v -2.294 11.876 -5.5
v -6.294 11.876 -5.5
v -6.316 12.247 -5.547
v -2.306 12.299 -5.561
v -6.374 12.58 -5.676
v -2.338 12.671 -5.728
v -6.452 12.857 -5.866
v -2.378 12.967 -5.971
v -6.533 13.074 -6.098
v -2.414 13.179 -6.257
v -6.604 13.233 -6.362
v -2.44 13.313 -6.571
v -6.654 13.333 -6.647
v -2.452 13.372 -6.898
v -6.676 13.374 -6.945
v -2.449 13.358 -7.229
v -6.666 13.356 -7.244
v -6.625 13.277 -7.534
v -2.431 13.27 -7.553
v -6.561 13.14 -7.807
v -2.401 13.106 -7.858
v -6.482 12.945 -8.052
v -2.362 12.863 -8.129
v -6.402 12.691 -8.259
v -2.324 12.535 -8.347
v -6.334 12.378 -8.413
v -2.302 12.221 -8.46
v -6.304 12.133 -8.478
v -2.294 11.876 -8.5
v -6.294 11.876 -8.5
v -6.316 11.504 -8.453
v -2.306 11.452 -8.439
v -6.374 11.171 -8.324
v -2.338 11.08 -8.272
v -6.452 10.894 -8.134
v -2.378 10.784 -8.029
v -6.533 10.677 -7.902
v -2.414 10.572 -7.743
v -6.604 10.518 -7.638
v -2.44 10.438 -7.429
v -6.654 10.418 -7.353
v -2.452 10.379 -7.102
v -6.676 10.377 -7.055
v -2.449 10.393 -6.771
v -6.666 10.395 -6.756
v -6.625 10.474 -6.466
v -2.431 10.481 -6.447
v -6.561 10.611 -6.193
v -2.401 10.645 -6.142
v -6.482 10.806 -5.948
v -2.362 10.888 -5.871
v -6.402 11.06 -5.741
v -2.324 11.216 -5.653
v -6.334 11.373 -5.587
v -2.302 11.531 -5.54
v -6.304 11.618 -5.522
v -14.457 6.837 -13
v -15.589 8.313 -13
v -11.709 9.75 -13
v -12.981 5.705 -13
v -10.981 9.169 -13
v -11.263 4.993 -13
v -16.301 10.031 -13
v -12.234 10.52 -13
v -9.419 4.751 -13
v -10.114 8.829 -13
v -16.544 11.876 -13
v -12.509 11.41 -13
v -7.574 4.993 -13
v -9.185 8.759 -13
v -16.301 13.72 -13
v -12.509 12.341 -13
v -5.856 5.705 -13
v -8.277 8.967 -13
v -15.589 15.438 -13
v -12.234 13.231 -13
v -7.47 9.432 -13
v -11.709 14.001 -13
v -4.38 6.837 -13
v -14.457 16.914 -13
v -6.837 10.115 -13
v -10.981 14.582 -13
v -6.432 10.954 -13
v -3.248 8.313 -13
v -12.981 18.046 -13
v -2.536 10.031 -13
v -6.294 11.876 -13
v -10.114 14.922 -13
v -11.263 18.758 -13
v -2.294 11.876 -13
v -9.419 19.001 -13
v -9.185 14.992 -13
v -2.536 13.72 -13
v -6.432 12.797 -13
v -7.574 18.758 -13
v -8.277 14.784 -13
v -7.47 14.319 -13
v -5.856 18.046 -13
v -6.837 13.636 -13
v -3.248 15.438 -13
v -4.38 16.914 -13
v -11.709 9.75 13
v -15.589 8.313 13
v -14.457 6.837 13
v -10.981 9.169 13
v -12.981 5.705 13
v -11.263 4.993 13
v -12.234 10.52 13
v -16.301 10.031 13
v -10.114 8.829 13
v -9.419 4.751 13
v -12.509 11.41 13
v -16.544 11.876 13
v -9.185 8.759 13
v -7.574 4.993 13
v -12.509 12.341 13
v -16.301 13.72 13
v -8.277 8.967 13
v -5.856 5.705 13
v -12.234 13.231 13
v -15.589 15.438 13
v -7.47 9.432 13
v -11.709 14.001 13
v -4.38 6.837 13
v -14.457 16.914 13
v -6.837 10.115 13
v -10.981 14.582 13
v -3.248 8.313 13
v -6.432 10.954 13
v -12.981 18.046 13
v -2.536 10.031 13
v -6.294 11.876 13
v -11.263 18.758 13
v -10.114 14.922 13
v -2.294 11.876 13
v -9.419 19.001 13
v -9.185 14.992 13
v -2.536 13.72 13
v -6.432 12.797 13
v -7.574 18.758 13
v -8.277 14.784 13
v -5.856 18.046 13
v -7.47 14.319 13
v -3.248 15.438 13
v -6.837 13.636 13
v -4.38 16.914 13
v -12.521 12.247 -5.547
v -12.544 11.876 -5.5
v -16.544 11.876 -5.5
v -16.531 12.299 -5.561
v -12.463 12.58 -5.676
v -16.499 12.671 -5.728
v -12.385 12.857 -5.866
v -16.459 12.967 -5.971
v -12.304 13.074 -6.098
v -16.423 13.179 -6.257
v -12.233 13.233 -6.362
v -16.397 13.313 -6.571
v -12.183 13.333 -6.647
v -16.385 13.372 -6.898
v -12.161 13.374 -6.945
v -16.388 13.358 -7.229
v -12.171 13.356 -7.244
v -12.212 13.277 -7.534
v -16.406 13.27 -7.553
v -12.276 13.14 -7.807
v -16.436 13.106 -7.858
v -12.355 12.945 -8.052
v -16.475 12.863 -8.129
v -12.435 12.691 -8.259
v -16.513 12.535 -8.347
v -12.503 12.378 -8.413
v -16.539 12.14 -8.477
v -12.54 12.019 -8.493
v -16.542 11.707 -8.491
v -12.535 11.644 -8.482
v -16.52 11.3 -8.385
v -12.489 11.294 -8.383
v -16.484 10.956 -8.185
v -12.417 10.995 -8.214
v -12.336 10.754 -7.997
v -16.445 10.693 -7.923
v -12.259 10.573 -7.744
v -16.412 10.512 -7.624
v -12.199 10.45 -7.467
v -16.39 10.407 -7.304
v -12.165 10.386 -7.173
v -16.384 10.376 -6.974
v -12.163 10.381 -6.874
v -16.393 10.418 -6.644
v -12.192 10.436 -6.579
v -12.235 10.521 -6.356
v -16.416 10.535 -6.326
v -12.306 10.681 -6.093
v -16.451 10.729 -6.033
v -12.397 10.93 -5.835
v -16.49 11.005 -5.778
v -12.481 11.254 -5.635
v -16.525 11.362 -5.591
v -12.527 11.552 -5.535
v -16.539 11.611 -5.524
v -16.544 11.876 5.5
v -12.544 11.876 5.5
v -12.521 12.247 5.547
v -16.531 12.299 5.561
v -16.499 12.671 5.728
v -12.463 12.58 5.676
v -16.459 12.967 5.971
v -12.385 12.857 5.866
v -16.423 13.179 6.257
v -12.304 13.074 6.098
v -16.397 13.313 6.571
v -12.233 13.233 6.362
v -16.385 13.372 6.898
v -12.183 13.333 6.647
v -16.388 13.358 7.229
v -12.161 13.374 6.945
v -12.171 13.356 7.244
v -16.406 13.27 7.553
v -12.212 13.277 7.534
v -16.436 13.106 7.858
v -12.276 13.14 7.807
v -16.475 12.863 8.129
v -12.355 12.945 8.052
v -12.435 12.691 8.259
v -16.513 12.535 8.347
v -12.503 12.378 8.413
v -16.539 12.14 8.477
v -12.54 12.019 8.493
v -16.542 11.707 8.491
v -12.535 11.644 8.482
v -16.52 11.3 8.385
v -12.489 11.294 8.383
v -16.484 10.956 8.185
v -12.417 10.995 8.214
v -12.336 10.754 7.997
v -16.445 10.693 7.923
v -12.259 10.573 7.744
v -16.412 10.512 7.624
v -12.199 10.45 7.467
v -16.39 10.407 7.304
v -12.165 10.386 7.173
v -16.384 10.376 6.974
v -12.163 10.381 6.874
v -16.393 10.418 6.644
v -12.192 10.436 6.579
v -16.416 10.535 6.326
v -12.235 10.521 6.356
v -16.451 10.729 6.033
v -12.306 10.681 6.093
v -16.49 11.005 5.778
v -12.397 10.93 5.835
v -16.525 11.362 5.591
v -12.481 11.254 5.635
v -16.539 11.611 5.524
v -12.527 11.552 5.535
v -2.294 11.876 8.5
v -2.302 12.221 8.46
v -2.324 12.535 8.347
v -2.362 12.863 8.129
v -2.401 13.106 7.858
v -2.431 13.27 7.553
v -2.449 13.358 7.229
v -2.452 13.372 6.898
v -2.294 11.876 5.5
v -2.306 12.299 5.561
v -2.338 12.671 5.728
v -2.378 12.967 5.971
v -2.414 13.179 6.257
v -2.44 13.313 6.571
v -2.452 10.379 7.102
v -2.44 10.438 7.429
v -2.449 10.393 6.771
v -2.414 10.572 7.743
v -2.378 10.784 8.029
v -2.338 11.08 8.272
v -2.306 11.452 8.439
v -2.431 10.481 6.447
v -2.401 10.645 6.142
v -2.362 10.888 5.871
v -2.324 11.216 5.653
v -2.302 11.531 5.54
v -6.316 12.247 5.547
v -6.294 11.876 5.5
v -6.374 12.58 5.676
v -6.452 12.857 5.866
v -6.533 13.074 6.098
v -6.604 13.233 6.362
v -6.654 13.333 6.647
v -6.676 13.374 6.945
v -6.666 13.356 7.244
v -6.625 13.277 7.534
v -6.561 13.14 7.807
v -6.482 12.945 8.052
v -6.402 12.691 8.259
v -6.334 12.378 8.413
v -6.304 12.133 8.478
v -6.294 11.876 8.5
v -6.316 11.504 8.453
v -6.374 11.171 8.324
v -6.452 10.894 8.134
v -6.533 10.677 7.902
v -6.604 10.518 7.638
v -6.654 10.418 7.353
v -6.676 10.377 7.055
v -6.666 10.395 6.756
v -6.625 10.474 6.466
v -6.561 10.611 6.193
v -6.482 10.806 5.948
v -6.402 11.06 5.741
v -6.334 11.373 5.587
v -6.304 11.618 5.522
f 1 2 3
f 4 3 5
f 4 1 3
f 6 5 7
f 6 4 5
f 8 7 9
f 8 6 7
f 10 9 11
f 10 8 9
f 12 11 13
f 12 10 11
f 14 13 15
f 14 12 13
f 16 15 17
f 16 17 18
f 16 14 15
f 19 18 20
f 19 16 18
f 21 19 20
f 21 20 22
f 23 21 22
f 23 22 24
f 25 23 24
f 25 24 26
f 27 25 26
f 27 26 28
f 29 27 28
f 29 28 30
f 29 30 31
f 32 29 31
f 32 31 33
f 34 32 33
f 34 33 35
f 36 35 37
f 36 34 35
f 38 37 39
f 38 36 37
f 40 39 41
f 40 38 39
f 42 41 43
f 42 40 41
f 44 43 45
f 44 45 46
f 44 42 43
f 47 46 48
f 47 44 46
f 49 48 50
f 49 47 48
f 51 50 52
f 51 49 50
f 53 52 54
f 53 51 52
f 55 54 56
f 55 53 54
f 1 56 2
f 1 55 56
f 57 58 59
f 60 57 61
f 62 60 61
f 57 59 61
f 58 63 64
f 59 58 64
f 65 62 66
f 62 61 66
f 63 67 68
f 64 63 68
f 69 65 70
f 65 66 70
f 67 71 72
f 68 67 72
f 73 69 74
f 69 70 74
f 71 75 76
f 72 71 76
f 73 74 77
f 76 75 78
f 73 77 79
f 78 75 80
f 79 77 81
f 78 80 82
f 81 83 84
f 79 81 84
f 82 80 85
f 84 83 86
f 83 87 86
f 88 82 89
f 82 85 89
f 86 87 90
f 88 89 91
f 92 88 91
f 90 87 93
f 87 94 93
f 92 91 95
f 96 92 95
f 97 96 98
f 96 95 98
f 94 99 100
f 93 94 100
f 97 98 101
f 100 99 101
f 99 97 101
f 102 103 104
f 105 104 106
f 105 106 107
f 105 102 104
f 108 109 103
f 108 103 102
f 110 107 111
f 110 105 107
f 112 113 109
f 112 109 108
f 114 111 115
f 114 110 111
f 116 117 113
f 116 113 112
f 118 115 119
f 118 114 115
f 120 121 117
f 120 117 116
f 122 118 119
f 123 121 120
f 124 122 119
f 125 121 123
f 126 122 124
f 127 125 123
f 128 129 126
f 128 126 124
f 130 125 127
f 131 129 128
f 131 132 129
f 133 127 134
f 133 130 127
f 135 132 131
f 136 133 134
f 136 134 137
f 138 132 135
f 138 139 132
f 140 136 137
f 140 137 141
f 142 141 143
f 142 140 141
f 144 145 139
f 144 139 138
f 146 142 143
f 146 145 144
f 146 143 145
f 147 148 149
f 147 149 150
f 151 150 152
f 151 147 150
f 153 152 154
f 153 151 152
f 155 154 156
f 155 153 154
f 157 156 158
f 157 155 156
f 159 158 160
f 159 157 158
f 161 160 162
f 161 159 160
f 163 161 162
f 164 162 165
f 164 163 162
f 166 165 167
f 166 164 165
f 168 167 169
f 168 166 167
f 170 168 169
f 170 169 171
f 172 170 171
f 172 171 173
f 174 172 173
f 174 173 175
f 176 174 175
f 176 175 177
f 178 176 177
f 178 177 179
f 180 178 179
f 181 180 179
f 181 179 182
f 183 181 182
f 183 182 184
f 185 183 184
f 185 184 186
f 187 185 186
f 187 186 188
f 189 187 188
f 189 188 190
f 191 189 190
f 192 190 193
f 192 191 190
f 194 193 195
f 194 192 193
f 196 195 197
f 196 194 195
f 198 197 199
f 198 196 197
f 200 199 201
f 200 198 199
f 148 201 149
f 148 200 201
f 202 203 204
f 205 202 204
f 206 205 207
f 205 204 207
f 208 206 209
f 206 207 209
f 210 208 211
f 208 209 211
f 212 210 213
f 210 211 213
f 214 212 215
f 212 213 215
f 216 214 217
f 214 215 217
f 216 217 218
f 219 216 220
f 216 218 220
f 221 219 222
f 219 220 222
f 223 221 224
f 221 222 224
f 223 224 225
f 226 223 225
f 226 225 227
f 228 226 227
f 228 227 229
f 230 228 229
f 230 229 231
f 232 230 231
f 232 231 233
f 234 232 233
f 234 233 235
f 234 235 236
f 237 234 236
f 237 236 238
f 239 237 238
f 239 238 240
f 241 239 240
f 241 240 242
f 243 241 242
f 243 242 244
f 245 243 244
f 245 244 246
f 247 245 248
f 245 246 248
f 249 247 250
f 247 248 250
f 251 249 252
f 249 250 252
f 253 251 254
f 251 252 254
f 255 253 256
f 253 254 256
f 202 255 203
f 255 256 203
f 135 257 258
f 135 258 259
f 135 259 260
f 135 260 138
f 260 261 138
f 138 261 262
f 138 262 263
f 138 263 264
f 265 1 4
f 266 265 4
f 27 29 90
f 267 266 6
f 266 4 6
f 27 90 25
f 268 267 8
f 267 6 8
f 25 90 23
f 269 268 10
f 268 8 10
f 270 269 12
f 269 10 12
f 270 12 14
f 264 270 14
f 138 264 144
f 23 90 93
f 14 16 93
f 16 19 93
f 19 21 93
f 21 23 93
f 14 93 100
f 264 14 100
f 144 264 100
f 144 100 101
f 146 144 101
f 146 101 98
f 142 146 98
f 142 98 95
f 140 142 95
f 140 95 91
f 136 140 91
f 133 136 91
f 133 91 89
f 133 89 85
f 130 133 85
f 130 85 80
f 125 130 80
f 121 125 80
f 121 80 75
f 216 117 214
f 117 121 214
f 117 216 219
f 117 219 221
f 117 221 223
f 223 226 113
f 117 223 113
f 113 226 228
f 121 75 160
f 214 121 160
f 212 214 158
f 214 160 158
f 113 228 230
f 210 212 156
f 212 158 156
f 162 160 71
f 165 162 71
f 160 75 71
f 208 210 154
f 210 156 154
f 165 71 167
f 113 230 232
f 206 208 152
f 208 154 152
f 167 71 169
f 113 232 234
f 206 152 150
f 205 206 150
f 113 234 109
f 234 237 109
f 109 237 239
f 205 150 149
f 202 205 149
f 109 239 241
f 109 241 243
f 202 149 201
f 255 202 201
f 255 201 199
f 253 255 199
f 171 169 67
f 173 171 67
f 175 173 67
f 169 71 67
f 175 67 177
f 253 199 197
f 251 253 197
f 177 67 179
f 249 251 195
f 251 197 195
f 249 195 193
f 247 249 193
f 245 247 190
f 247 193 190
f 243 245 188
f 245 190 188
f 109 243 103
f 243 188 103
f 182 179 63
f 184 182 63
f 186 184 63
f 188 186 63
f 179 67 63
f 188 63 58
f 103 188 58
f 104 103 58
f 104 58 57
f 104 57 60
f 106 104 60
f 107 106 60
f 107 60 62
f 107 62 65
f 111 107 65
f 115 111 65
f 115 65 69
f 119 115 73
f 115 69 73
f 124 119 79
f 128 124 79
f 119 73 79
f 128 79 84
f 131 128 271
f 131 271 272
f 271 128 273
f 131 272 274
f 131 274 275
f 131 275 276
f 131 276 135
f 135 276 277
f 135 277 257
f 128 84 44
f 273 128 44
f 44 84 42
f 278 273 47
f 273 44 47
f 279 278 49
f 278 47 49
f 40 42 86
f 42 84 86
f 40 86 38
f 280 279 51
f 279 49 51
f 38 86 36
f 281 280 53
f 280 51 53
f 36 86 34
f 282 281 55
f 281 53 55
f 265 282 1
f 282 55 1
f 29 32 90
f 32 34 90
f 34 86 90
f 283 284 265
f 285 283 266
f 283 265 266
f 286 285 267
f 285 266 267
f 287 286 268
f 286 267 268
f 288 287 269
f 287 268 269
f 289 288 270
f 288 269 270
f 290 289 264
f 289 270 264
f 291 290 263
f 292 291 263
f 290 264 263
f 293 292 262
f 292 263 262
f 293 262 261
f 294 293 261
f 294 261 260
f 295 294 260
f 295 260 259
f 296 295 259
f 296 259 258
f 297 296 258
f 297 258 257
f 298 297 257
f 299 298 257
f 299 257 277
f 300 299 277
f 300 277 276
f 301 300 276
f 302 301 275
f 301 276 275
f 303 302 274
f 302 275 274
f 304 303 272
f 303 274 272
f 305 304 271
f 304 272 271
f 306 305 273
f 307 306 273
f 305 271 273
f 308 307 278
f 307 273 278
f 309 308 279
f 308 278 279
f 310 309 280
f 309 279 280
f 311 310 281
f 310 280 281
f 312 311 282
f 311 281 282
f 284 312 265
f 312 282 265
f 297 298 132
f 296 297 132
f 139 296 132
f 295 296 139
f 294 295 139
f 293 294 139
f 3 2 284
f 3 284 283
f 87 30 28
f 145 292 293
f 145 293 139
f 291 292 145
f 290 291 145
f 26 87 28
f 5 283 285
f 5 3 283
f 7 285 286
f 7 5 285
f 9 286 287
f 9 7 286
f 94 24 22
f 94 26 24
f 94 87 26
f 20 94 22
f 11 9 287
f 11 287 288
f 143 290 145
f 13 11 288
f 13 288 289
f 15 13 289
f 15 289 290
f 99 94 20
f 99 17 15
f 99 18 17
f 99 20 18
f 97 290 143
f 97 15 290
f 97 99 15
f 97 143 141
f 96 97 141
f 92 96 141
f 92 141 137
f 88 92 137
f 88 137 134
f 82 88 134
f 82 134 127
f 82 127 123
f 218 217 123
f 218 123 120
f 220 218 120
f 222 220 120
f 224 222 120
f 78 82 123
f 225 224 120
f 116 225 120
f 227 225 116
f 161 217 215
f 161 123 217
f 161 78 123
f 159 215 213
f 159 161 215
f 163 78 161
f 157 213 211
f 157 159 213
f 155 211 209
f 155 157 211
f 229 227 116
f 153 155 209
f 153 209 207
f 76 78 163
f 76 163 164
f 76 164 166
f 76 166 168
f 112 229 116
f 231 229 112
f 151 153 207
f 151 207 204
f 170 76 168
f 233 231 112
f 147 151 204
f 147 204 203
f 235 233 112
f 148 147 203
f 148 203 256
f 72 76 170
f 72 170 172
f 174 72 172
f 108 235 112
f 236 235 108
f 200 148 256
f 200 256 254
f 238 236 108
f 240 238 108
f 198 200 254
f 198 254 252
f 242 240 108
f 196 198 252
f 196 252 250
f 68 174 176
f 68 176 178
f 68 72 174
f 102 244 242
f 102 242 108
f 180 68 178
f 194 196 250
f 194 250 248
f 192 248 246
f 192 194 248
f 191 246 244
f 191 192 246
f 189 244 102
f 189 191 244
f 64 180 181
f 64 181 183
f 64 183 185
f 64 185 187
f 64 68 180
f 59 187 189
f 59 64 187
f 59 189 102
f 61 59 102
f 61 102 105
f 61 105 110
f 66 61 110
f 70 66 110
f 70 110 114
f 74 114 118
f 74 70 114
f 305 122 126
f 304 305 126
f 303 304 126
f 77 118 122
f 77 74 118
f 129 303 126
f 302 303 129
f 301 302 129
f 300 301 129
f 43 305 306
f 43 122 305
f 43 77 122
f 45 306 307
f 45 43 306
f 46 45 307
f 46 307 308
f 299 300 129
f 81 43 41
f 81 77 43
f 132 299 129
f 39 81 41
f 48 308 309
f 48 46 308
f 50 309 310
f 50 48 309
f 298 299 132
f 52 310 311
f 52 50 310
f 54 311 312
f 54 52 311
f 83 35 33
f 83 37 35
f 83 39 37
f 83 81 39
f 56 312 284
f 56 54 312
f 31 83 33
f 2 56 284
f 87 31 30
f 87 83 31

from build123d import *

# Parameters (mm, degrees)
BOSS_EXTRUDE1_DEPTH      = 13
BOSS_EXTRUDE1_DEPTH_BACK = 13
SKETCH1_R                = 7.125
SKETCH1_R_2              = 3.125
SKETCH2_R                = 1.5
CUT_EXTRUDE1_DEPTH       = 20


with BuildPart() as part:
    # Sketch1 → Boss-Extrude1 (new, two sides: drawn at the far end of the back side and taken through both)
    with BuildSketch(Plane.XY.offset(-BOSS_EXTRUDE1_DEPTH_BACK)):
        with Locations((-9.418504592, 11.87550579)):
            Circle(SKETCH1_R)
        with Locations((-9.418504592, 11.87550579)):
            Circle(SKETCH1_R_2, mode=Mode.SUBTRACT)
    extrude(amount=BOSS_EXTRUDE1_DEPTH + BOSS_EXTRUDE1_DEPTH_BACK)

    # Sketch2 → Cut-Extrude1 (cut)
    with BuildSketch(Plane(origin=(0, 0, 0), x_dir=(0, 0, -1), z_dir=(1, 0, 0))):
        with Locations((-7, 11.87550579)):
            Circle(SKETCH2_R)
    cut_extrude1 = extrude(amount=-CUT_EXTRUDE1_DEPTH, mode=Mode.SUBTRACT)

    # Mirror1: Cut-Extrude1 across plane
    add(cut_extrude1.mirror(Plane.XY), mode=Mode.SUBTRACT)


solid = part.part
